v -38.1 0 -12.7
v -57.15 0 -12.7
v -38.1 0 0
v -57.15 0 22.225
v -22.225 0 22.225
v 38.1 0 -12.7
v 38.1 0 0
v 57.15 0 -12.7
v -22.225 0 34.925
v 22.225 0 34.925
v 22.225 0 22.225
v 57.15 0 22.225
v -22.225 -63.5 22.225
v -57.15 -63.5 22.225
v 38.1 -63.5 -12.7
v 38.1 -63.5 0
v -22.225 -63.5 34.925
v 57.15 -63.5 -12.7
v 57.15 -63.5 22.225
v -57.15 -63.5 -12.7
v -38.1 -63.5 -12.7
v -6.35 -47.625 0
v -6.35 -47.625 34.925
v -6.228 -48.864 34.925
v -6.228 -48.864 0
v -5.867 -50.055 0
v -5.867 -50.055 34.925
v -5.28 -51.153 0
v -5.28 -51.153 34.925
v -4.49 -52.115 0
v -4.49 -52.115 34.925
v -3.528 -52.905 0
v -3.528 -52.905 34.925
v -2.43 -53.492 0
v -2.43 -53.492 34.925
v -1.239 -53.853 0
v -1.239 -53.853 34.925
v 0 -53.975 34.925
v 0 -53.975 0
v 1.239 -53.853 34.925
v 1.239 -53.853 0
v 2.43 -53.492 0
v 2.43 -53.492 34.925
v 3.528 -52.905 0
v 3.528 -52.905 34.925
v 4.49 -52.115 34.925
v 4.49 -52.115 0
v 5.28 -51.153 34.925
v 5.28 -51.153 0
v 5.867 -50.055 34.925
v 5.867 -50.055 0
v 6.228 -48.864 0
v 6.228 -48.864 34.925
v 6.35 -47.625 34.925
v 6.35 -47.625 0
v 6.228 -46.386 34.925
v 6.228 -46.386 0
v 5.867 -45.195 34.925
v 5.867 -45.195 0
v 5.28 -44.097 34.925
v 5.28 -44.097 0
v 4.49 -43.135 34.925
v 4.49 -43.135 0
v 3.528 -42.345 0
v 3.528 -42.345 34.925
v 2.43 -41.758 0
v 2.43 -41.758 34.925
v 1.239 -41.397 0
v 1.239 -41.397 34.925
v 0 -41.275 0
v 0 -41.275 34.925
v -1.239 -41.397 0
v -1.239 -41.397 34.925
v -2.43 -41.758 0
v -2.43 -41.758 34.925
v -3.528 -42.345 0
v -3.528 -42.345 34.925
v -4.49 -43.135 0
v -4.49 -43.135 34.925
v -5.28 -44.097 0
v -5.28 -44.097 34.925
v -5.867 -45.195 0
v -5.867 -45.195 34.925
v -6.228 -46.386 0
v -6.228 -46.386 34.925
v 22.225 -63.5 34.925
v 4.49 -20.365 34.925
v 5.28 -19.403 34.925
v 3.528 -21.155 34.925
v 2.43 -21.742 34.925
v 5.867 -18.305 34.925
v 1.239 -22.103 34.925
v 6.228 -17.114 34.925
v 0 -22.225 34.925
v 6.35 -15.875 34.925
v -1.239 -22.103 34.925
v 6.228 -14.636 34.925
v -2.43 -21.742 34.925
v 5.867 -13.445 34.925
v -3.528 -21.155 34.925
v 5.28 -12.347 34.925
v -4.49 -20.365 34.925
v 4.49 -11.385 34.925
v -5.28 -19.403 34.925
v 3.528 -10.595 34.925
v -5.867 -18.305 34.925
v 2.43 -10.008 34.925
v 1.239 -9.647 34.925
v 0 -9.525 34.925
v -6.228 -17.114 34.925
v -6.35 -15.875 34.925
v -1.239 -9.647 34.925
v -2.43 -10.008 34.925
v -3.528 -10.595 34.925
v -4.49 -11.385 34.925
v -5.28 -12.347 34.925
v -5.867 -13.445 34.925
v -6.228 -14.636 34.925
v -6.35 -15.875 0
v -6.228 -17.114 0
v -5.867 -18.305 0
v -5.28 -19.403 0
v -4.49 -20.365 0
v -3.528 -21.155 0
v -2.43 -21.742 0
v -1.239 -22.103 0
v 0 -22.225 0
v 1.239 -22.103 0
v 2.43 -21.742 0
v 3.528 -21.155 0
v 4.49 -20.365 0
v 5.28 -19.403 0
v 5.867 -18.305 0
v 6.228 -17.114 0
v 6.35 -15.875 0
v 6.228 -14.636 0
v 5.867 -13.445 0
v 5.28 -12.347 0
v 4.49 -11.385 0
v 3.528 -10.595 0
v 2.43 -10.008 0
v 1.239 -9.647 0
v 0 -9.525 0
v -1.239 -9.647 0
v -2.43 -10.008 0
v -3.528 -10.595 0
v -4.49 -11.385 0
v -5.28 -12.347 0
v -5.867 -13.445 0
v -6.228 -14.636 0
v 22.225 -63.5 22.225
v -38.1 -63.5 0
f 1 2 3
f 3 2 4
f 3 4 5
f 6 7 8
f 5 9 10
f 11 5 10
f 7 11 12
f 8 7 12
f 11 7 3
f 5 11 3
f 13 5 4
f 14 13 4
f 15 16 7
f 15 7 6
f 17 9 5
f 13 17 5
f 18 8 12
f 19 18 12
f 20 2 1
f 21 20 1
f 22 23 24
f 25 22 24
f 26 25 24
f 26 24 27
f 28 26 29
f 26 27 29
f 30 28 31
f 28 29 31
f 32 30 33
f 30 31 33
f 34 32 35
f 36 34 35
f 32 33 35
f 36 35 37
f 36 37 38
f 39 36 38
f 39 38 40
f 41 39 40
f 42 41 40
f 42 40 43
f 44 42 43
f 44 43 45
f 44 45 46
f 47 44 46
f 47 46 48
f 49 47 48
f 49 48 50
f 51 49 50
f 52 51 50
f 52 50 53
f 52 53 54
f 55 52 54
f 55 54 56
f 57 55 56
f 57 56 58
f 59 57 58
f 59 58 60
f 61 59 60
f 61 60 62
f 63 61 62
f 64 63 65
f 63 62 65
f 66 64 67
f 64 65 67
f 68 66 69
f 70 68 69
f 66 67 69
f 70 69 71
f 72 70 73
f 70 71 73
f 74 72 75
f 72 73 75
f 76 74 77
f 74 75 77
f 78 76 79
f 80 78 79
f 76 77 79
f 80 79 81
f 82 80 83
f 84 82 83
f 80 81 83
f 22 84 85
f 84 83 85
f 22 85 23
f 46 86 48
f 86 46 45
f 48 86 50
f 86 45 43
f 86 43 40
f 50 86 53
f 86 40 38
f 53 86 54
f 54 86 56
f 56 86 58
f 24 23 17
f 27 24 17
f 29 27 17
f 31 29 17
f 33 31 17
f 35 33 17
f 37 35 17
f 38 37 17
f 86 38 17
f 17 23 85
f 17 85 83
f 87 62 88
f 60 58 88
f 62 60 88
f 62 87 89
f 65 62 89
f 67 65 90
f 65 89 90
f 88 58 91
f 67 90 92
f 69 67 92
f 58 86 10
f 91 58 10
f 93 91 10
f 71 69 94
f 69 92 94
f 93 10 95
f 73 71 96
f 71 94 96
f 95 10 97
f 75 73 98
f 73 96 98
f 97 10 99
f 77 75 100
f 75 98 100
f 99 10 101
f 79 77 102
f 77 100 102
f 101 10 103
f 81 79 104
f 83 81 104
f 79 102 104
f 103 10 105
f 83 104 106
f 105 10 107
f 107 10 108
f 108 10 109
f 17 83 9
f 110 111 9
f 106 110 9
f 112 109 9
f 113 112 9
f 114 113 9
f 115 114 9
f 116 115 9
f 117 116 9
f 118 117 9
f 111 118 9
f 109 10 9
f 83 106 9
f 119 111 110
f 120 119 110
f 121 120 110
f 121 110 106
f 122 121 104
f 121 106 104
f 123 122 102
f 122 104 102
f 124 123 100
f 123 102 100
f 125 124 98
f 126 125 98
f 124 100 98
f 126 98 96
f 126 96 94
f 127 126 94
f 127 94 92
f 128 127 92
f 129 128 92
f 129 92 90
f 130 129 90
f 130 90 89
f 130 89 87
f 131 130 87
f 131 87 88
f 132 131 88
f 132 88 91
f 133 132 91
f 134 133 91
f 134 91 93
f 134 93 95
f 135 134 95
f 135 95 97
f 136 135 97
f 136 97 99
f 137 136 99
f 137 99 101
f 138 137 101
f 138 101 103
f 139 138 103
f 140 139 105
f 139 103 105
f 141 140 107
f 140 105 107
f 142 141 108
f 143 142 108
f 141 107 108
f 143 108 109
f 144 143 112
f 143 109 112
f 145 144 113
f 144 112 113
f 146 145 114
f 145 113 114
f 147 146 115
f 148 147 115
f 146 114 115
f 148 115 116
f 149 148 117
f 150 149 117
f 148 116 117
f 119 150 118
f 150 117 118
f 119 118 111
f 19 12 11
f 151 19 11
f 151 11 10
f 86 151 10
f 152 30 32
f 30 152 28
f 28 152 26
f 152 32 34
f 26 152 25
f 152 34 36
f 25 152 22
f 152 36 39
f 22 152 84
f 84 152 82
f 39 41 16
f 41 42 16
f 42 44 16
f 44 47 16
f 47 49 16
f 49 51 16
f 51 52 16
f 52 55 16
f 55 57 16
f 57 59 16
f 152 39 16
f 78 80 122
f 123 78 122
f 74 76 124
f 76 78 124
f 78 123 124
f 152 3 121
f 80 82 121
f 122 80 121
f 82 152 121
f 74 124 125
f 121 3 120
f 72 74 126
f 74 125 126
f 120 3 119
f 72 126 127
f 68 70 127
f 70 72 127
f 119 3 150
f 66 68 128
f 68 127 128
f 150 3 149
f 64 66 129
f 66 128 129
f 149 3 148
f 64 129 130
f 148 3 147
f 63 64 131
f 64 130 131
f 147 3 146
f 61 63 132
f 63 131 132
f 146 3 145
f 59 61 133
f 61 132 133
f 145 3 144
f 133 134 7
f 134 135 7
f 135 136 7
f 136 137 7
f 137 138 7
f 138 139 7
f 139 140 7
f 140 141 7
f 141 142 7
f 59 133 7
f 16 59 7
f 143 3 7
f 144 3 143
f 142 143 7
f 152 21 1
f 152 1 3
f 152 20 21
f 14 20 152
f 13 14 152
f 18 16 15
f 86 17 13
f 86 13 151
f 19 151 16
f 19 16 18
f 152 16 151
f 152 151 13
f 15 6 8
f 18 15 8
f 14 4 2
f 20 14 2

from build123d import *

# Parameters (mm, degrees)
F1_DEPTH = 63.5
F3_D     = 12.7
F4_D     = 12.7


with BuildPart() as f1:
    # F0 (on Front) → F1 (new body)
    with BuildSketch(Plane.XZ):
        Polygon((-38.1, -12.7), (-38.1, 0), (38.1, 0), (38.1, -12.7), (57.15, -12.7), (57.15, 22.225), (22.225, 22.225), (22.225, 34.925), (-22.225, 34.925), (-22.225, 22.225), (-57.15, 22.225), (-57.15, -12.7), align=None)
    extrude(amount=F1_DEPTH)

    # F3 (through all)
    with Locations(Plane(origin=(0, 0, 0), x_dir=(1, 0, 0), z_dir=(0, 0, -1))):
        with Locations((0, 47.625)):
            Hole(F3_D / 2)

    # F4 (through all)
    with Locations(Plane(origin=(0, 0, 0), x_dir=(1, 0, 0), z_dir=(0, 0, -1))):
        with Locations((0, 15.875)):
            Hole(F4_D / 2)


solid = f1.part
